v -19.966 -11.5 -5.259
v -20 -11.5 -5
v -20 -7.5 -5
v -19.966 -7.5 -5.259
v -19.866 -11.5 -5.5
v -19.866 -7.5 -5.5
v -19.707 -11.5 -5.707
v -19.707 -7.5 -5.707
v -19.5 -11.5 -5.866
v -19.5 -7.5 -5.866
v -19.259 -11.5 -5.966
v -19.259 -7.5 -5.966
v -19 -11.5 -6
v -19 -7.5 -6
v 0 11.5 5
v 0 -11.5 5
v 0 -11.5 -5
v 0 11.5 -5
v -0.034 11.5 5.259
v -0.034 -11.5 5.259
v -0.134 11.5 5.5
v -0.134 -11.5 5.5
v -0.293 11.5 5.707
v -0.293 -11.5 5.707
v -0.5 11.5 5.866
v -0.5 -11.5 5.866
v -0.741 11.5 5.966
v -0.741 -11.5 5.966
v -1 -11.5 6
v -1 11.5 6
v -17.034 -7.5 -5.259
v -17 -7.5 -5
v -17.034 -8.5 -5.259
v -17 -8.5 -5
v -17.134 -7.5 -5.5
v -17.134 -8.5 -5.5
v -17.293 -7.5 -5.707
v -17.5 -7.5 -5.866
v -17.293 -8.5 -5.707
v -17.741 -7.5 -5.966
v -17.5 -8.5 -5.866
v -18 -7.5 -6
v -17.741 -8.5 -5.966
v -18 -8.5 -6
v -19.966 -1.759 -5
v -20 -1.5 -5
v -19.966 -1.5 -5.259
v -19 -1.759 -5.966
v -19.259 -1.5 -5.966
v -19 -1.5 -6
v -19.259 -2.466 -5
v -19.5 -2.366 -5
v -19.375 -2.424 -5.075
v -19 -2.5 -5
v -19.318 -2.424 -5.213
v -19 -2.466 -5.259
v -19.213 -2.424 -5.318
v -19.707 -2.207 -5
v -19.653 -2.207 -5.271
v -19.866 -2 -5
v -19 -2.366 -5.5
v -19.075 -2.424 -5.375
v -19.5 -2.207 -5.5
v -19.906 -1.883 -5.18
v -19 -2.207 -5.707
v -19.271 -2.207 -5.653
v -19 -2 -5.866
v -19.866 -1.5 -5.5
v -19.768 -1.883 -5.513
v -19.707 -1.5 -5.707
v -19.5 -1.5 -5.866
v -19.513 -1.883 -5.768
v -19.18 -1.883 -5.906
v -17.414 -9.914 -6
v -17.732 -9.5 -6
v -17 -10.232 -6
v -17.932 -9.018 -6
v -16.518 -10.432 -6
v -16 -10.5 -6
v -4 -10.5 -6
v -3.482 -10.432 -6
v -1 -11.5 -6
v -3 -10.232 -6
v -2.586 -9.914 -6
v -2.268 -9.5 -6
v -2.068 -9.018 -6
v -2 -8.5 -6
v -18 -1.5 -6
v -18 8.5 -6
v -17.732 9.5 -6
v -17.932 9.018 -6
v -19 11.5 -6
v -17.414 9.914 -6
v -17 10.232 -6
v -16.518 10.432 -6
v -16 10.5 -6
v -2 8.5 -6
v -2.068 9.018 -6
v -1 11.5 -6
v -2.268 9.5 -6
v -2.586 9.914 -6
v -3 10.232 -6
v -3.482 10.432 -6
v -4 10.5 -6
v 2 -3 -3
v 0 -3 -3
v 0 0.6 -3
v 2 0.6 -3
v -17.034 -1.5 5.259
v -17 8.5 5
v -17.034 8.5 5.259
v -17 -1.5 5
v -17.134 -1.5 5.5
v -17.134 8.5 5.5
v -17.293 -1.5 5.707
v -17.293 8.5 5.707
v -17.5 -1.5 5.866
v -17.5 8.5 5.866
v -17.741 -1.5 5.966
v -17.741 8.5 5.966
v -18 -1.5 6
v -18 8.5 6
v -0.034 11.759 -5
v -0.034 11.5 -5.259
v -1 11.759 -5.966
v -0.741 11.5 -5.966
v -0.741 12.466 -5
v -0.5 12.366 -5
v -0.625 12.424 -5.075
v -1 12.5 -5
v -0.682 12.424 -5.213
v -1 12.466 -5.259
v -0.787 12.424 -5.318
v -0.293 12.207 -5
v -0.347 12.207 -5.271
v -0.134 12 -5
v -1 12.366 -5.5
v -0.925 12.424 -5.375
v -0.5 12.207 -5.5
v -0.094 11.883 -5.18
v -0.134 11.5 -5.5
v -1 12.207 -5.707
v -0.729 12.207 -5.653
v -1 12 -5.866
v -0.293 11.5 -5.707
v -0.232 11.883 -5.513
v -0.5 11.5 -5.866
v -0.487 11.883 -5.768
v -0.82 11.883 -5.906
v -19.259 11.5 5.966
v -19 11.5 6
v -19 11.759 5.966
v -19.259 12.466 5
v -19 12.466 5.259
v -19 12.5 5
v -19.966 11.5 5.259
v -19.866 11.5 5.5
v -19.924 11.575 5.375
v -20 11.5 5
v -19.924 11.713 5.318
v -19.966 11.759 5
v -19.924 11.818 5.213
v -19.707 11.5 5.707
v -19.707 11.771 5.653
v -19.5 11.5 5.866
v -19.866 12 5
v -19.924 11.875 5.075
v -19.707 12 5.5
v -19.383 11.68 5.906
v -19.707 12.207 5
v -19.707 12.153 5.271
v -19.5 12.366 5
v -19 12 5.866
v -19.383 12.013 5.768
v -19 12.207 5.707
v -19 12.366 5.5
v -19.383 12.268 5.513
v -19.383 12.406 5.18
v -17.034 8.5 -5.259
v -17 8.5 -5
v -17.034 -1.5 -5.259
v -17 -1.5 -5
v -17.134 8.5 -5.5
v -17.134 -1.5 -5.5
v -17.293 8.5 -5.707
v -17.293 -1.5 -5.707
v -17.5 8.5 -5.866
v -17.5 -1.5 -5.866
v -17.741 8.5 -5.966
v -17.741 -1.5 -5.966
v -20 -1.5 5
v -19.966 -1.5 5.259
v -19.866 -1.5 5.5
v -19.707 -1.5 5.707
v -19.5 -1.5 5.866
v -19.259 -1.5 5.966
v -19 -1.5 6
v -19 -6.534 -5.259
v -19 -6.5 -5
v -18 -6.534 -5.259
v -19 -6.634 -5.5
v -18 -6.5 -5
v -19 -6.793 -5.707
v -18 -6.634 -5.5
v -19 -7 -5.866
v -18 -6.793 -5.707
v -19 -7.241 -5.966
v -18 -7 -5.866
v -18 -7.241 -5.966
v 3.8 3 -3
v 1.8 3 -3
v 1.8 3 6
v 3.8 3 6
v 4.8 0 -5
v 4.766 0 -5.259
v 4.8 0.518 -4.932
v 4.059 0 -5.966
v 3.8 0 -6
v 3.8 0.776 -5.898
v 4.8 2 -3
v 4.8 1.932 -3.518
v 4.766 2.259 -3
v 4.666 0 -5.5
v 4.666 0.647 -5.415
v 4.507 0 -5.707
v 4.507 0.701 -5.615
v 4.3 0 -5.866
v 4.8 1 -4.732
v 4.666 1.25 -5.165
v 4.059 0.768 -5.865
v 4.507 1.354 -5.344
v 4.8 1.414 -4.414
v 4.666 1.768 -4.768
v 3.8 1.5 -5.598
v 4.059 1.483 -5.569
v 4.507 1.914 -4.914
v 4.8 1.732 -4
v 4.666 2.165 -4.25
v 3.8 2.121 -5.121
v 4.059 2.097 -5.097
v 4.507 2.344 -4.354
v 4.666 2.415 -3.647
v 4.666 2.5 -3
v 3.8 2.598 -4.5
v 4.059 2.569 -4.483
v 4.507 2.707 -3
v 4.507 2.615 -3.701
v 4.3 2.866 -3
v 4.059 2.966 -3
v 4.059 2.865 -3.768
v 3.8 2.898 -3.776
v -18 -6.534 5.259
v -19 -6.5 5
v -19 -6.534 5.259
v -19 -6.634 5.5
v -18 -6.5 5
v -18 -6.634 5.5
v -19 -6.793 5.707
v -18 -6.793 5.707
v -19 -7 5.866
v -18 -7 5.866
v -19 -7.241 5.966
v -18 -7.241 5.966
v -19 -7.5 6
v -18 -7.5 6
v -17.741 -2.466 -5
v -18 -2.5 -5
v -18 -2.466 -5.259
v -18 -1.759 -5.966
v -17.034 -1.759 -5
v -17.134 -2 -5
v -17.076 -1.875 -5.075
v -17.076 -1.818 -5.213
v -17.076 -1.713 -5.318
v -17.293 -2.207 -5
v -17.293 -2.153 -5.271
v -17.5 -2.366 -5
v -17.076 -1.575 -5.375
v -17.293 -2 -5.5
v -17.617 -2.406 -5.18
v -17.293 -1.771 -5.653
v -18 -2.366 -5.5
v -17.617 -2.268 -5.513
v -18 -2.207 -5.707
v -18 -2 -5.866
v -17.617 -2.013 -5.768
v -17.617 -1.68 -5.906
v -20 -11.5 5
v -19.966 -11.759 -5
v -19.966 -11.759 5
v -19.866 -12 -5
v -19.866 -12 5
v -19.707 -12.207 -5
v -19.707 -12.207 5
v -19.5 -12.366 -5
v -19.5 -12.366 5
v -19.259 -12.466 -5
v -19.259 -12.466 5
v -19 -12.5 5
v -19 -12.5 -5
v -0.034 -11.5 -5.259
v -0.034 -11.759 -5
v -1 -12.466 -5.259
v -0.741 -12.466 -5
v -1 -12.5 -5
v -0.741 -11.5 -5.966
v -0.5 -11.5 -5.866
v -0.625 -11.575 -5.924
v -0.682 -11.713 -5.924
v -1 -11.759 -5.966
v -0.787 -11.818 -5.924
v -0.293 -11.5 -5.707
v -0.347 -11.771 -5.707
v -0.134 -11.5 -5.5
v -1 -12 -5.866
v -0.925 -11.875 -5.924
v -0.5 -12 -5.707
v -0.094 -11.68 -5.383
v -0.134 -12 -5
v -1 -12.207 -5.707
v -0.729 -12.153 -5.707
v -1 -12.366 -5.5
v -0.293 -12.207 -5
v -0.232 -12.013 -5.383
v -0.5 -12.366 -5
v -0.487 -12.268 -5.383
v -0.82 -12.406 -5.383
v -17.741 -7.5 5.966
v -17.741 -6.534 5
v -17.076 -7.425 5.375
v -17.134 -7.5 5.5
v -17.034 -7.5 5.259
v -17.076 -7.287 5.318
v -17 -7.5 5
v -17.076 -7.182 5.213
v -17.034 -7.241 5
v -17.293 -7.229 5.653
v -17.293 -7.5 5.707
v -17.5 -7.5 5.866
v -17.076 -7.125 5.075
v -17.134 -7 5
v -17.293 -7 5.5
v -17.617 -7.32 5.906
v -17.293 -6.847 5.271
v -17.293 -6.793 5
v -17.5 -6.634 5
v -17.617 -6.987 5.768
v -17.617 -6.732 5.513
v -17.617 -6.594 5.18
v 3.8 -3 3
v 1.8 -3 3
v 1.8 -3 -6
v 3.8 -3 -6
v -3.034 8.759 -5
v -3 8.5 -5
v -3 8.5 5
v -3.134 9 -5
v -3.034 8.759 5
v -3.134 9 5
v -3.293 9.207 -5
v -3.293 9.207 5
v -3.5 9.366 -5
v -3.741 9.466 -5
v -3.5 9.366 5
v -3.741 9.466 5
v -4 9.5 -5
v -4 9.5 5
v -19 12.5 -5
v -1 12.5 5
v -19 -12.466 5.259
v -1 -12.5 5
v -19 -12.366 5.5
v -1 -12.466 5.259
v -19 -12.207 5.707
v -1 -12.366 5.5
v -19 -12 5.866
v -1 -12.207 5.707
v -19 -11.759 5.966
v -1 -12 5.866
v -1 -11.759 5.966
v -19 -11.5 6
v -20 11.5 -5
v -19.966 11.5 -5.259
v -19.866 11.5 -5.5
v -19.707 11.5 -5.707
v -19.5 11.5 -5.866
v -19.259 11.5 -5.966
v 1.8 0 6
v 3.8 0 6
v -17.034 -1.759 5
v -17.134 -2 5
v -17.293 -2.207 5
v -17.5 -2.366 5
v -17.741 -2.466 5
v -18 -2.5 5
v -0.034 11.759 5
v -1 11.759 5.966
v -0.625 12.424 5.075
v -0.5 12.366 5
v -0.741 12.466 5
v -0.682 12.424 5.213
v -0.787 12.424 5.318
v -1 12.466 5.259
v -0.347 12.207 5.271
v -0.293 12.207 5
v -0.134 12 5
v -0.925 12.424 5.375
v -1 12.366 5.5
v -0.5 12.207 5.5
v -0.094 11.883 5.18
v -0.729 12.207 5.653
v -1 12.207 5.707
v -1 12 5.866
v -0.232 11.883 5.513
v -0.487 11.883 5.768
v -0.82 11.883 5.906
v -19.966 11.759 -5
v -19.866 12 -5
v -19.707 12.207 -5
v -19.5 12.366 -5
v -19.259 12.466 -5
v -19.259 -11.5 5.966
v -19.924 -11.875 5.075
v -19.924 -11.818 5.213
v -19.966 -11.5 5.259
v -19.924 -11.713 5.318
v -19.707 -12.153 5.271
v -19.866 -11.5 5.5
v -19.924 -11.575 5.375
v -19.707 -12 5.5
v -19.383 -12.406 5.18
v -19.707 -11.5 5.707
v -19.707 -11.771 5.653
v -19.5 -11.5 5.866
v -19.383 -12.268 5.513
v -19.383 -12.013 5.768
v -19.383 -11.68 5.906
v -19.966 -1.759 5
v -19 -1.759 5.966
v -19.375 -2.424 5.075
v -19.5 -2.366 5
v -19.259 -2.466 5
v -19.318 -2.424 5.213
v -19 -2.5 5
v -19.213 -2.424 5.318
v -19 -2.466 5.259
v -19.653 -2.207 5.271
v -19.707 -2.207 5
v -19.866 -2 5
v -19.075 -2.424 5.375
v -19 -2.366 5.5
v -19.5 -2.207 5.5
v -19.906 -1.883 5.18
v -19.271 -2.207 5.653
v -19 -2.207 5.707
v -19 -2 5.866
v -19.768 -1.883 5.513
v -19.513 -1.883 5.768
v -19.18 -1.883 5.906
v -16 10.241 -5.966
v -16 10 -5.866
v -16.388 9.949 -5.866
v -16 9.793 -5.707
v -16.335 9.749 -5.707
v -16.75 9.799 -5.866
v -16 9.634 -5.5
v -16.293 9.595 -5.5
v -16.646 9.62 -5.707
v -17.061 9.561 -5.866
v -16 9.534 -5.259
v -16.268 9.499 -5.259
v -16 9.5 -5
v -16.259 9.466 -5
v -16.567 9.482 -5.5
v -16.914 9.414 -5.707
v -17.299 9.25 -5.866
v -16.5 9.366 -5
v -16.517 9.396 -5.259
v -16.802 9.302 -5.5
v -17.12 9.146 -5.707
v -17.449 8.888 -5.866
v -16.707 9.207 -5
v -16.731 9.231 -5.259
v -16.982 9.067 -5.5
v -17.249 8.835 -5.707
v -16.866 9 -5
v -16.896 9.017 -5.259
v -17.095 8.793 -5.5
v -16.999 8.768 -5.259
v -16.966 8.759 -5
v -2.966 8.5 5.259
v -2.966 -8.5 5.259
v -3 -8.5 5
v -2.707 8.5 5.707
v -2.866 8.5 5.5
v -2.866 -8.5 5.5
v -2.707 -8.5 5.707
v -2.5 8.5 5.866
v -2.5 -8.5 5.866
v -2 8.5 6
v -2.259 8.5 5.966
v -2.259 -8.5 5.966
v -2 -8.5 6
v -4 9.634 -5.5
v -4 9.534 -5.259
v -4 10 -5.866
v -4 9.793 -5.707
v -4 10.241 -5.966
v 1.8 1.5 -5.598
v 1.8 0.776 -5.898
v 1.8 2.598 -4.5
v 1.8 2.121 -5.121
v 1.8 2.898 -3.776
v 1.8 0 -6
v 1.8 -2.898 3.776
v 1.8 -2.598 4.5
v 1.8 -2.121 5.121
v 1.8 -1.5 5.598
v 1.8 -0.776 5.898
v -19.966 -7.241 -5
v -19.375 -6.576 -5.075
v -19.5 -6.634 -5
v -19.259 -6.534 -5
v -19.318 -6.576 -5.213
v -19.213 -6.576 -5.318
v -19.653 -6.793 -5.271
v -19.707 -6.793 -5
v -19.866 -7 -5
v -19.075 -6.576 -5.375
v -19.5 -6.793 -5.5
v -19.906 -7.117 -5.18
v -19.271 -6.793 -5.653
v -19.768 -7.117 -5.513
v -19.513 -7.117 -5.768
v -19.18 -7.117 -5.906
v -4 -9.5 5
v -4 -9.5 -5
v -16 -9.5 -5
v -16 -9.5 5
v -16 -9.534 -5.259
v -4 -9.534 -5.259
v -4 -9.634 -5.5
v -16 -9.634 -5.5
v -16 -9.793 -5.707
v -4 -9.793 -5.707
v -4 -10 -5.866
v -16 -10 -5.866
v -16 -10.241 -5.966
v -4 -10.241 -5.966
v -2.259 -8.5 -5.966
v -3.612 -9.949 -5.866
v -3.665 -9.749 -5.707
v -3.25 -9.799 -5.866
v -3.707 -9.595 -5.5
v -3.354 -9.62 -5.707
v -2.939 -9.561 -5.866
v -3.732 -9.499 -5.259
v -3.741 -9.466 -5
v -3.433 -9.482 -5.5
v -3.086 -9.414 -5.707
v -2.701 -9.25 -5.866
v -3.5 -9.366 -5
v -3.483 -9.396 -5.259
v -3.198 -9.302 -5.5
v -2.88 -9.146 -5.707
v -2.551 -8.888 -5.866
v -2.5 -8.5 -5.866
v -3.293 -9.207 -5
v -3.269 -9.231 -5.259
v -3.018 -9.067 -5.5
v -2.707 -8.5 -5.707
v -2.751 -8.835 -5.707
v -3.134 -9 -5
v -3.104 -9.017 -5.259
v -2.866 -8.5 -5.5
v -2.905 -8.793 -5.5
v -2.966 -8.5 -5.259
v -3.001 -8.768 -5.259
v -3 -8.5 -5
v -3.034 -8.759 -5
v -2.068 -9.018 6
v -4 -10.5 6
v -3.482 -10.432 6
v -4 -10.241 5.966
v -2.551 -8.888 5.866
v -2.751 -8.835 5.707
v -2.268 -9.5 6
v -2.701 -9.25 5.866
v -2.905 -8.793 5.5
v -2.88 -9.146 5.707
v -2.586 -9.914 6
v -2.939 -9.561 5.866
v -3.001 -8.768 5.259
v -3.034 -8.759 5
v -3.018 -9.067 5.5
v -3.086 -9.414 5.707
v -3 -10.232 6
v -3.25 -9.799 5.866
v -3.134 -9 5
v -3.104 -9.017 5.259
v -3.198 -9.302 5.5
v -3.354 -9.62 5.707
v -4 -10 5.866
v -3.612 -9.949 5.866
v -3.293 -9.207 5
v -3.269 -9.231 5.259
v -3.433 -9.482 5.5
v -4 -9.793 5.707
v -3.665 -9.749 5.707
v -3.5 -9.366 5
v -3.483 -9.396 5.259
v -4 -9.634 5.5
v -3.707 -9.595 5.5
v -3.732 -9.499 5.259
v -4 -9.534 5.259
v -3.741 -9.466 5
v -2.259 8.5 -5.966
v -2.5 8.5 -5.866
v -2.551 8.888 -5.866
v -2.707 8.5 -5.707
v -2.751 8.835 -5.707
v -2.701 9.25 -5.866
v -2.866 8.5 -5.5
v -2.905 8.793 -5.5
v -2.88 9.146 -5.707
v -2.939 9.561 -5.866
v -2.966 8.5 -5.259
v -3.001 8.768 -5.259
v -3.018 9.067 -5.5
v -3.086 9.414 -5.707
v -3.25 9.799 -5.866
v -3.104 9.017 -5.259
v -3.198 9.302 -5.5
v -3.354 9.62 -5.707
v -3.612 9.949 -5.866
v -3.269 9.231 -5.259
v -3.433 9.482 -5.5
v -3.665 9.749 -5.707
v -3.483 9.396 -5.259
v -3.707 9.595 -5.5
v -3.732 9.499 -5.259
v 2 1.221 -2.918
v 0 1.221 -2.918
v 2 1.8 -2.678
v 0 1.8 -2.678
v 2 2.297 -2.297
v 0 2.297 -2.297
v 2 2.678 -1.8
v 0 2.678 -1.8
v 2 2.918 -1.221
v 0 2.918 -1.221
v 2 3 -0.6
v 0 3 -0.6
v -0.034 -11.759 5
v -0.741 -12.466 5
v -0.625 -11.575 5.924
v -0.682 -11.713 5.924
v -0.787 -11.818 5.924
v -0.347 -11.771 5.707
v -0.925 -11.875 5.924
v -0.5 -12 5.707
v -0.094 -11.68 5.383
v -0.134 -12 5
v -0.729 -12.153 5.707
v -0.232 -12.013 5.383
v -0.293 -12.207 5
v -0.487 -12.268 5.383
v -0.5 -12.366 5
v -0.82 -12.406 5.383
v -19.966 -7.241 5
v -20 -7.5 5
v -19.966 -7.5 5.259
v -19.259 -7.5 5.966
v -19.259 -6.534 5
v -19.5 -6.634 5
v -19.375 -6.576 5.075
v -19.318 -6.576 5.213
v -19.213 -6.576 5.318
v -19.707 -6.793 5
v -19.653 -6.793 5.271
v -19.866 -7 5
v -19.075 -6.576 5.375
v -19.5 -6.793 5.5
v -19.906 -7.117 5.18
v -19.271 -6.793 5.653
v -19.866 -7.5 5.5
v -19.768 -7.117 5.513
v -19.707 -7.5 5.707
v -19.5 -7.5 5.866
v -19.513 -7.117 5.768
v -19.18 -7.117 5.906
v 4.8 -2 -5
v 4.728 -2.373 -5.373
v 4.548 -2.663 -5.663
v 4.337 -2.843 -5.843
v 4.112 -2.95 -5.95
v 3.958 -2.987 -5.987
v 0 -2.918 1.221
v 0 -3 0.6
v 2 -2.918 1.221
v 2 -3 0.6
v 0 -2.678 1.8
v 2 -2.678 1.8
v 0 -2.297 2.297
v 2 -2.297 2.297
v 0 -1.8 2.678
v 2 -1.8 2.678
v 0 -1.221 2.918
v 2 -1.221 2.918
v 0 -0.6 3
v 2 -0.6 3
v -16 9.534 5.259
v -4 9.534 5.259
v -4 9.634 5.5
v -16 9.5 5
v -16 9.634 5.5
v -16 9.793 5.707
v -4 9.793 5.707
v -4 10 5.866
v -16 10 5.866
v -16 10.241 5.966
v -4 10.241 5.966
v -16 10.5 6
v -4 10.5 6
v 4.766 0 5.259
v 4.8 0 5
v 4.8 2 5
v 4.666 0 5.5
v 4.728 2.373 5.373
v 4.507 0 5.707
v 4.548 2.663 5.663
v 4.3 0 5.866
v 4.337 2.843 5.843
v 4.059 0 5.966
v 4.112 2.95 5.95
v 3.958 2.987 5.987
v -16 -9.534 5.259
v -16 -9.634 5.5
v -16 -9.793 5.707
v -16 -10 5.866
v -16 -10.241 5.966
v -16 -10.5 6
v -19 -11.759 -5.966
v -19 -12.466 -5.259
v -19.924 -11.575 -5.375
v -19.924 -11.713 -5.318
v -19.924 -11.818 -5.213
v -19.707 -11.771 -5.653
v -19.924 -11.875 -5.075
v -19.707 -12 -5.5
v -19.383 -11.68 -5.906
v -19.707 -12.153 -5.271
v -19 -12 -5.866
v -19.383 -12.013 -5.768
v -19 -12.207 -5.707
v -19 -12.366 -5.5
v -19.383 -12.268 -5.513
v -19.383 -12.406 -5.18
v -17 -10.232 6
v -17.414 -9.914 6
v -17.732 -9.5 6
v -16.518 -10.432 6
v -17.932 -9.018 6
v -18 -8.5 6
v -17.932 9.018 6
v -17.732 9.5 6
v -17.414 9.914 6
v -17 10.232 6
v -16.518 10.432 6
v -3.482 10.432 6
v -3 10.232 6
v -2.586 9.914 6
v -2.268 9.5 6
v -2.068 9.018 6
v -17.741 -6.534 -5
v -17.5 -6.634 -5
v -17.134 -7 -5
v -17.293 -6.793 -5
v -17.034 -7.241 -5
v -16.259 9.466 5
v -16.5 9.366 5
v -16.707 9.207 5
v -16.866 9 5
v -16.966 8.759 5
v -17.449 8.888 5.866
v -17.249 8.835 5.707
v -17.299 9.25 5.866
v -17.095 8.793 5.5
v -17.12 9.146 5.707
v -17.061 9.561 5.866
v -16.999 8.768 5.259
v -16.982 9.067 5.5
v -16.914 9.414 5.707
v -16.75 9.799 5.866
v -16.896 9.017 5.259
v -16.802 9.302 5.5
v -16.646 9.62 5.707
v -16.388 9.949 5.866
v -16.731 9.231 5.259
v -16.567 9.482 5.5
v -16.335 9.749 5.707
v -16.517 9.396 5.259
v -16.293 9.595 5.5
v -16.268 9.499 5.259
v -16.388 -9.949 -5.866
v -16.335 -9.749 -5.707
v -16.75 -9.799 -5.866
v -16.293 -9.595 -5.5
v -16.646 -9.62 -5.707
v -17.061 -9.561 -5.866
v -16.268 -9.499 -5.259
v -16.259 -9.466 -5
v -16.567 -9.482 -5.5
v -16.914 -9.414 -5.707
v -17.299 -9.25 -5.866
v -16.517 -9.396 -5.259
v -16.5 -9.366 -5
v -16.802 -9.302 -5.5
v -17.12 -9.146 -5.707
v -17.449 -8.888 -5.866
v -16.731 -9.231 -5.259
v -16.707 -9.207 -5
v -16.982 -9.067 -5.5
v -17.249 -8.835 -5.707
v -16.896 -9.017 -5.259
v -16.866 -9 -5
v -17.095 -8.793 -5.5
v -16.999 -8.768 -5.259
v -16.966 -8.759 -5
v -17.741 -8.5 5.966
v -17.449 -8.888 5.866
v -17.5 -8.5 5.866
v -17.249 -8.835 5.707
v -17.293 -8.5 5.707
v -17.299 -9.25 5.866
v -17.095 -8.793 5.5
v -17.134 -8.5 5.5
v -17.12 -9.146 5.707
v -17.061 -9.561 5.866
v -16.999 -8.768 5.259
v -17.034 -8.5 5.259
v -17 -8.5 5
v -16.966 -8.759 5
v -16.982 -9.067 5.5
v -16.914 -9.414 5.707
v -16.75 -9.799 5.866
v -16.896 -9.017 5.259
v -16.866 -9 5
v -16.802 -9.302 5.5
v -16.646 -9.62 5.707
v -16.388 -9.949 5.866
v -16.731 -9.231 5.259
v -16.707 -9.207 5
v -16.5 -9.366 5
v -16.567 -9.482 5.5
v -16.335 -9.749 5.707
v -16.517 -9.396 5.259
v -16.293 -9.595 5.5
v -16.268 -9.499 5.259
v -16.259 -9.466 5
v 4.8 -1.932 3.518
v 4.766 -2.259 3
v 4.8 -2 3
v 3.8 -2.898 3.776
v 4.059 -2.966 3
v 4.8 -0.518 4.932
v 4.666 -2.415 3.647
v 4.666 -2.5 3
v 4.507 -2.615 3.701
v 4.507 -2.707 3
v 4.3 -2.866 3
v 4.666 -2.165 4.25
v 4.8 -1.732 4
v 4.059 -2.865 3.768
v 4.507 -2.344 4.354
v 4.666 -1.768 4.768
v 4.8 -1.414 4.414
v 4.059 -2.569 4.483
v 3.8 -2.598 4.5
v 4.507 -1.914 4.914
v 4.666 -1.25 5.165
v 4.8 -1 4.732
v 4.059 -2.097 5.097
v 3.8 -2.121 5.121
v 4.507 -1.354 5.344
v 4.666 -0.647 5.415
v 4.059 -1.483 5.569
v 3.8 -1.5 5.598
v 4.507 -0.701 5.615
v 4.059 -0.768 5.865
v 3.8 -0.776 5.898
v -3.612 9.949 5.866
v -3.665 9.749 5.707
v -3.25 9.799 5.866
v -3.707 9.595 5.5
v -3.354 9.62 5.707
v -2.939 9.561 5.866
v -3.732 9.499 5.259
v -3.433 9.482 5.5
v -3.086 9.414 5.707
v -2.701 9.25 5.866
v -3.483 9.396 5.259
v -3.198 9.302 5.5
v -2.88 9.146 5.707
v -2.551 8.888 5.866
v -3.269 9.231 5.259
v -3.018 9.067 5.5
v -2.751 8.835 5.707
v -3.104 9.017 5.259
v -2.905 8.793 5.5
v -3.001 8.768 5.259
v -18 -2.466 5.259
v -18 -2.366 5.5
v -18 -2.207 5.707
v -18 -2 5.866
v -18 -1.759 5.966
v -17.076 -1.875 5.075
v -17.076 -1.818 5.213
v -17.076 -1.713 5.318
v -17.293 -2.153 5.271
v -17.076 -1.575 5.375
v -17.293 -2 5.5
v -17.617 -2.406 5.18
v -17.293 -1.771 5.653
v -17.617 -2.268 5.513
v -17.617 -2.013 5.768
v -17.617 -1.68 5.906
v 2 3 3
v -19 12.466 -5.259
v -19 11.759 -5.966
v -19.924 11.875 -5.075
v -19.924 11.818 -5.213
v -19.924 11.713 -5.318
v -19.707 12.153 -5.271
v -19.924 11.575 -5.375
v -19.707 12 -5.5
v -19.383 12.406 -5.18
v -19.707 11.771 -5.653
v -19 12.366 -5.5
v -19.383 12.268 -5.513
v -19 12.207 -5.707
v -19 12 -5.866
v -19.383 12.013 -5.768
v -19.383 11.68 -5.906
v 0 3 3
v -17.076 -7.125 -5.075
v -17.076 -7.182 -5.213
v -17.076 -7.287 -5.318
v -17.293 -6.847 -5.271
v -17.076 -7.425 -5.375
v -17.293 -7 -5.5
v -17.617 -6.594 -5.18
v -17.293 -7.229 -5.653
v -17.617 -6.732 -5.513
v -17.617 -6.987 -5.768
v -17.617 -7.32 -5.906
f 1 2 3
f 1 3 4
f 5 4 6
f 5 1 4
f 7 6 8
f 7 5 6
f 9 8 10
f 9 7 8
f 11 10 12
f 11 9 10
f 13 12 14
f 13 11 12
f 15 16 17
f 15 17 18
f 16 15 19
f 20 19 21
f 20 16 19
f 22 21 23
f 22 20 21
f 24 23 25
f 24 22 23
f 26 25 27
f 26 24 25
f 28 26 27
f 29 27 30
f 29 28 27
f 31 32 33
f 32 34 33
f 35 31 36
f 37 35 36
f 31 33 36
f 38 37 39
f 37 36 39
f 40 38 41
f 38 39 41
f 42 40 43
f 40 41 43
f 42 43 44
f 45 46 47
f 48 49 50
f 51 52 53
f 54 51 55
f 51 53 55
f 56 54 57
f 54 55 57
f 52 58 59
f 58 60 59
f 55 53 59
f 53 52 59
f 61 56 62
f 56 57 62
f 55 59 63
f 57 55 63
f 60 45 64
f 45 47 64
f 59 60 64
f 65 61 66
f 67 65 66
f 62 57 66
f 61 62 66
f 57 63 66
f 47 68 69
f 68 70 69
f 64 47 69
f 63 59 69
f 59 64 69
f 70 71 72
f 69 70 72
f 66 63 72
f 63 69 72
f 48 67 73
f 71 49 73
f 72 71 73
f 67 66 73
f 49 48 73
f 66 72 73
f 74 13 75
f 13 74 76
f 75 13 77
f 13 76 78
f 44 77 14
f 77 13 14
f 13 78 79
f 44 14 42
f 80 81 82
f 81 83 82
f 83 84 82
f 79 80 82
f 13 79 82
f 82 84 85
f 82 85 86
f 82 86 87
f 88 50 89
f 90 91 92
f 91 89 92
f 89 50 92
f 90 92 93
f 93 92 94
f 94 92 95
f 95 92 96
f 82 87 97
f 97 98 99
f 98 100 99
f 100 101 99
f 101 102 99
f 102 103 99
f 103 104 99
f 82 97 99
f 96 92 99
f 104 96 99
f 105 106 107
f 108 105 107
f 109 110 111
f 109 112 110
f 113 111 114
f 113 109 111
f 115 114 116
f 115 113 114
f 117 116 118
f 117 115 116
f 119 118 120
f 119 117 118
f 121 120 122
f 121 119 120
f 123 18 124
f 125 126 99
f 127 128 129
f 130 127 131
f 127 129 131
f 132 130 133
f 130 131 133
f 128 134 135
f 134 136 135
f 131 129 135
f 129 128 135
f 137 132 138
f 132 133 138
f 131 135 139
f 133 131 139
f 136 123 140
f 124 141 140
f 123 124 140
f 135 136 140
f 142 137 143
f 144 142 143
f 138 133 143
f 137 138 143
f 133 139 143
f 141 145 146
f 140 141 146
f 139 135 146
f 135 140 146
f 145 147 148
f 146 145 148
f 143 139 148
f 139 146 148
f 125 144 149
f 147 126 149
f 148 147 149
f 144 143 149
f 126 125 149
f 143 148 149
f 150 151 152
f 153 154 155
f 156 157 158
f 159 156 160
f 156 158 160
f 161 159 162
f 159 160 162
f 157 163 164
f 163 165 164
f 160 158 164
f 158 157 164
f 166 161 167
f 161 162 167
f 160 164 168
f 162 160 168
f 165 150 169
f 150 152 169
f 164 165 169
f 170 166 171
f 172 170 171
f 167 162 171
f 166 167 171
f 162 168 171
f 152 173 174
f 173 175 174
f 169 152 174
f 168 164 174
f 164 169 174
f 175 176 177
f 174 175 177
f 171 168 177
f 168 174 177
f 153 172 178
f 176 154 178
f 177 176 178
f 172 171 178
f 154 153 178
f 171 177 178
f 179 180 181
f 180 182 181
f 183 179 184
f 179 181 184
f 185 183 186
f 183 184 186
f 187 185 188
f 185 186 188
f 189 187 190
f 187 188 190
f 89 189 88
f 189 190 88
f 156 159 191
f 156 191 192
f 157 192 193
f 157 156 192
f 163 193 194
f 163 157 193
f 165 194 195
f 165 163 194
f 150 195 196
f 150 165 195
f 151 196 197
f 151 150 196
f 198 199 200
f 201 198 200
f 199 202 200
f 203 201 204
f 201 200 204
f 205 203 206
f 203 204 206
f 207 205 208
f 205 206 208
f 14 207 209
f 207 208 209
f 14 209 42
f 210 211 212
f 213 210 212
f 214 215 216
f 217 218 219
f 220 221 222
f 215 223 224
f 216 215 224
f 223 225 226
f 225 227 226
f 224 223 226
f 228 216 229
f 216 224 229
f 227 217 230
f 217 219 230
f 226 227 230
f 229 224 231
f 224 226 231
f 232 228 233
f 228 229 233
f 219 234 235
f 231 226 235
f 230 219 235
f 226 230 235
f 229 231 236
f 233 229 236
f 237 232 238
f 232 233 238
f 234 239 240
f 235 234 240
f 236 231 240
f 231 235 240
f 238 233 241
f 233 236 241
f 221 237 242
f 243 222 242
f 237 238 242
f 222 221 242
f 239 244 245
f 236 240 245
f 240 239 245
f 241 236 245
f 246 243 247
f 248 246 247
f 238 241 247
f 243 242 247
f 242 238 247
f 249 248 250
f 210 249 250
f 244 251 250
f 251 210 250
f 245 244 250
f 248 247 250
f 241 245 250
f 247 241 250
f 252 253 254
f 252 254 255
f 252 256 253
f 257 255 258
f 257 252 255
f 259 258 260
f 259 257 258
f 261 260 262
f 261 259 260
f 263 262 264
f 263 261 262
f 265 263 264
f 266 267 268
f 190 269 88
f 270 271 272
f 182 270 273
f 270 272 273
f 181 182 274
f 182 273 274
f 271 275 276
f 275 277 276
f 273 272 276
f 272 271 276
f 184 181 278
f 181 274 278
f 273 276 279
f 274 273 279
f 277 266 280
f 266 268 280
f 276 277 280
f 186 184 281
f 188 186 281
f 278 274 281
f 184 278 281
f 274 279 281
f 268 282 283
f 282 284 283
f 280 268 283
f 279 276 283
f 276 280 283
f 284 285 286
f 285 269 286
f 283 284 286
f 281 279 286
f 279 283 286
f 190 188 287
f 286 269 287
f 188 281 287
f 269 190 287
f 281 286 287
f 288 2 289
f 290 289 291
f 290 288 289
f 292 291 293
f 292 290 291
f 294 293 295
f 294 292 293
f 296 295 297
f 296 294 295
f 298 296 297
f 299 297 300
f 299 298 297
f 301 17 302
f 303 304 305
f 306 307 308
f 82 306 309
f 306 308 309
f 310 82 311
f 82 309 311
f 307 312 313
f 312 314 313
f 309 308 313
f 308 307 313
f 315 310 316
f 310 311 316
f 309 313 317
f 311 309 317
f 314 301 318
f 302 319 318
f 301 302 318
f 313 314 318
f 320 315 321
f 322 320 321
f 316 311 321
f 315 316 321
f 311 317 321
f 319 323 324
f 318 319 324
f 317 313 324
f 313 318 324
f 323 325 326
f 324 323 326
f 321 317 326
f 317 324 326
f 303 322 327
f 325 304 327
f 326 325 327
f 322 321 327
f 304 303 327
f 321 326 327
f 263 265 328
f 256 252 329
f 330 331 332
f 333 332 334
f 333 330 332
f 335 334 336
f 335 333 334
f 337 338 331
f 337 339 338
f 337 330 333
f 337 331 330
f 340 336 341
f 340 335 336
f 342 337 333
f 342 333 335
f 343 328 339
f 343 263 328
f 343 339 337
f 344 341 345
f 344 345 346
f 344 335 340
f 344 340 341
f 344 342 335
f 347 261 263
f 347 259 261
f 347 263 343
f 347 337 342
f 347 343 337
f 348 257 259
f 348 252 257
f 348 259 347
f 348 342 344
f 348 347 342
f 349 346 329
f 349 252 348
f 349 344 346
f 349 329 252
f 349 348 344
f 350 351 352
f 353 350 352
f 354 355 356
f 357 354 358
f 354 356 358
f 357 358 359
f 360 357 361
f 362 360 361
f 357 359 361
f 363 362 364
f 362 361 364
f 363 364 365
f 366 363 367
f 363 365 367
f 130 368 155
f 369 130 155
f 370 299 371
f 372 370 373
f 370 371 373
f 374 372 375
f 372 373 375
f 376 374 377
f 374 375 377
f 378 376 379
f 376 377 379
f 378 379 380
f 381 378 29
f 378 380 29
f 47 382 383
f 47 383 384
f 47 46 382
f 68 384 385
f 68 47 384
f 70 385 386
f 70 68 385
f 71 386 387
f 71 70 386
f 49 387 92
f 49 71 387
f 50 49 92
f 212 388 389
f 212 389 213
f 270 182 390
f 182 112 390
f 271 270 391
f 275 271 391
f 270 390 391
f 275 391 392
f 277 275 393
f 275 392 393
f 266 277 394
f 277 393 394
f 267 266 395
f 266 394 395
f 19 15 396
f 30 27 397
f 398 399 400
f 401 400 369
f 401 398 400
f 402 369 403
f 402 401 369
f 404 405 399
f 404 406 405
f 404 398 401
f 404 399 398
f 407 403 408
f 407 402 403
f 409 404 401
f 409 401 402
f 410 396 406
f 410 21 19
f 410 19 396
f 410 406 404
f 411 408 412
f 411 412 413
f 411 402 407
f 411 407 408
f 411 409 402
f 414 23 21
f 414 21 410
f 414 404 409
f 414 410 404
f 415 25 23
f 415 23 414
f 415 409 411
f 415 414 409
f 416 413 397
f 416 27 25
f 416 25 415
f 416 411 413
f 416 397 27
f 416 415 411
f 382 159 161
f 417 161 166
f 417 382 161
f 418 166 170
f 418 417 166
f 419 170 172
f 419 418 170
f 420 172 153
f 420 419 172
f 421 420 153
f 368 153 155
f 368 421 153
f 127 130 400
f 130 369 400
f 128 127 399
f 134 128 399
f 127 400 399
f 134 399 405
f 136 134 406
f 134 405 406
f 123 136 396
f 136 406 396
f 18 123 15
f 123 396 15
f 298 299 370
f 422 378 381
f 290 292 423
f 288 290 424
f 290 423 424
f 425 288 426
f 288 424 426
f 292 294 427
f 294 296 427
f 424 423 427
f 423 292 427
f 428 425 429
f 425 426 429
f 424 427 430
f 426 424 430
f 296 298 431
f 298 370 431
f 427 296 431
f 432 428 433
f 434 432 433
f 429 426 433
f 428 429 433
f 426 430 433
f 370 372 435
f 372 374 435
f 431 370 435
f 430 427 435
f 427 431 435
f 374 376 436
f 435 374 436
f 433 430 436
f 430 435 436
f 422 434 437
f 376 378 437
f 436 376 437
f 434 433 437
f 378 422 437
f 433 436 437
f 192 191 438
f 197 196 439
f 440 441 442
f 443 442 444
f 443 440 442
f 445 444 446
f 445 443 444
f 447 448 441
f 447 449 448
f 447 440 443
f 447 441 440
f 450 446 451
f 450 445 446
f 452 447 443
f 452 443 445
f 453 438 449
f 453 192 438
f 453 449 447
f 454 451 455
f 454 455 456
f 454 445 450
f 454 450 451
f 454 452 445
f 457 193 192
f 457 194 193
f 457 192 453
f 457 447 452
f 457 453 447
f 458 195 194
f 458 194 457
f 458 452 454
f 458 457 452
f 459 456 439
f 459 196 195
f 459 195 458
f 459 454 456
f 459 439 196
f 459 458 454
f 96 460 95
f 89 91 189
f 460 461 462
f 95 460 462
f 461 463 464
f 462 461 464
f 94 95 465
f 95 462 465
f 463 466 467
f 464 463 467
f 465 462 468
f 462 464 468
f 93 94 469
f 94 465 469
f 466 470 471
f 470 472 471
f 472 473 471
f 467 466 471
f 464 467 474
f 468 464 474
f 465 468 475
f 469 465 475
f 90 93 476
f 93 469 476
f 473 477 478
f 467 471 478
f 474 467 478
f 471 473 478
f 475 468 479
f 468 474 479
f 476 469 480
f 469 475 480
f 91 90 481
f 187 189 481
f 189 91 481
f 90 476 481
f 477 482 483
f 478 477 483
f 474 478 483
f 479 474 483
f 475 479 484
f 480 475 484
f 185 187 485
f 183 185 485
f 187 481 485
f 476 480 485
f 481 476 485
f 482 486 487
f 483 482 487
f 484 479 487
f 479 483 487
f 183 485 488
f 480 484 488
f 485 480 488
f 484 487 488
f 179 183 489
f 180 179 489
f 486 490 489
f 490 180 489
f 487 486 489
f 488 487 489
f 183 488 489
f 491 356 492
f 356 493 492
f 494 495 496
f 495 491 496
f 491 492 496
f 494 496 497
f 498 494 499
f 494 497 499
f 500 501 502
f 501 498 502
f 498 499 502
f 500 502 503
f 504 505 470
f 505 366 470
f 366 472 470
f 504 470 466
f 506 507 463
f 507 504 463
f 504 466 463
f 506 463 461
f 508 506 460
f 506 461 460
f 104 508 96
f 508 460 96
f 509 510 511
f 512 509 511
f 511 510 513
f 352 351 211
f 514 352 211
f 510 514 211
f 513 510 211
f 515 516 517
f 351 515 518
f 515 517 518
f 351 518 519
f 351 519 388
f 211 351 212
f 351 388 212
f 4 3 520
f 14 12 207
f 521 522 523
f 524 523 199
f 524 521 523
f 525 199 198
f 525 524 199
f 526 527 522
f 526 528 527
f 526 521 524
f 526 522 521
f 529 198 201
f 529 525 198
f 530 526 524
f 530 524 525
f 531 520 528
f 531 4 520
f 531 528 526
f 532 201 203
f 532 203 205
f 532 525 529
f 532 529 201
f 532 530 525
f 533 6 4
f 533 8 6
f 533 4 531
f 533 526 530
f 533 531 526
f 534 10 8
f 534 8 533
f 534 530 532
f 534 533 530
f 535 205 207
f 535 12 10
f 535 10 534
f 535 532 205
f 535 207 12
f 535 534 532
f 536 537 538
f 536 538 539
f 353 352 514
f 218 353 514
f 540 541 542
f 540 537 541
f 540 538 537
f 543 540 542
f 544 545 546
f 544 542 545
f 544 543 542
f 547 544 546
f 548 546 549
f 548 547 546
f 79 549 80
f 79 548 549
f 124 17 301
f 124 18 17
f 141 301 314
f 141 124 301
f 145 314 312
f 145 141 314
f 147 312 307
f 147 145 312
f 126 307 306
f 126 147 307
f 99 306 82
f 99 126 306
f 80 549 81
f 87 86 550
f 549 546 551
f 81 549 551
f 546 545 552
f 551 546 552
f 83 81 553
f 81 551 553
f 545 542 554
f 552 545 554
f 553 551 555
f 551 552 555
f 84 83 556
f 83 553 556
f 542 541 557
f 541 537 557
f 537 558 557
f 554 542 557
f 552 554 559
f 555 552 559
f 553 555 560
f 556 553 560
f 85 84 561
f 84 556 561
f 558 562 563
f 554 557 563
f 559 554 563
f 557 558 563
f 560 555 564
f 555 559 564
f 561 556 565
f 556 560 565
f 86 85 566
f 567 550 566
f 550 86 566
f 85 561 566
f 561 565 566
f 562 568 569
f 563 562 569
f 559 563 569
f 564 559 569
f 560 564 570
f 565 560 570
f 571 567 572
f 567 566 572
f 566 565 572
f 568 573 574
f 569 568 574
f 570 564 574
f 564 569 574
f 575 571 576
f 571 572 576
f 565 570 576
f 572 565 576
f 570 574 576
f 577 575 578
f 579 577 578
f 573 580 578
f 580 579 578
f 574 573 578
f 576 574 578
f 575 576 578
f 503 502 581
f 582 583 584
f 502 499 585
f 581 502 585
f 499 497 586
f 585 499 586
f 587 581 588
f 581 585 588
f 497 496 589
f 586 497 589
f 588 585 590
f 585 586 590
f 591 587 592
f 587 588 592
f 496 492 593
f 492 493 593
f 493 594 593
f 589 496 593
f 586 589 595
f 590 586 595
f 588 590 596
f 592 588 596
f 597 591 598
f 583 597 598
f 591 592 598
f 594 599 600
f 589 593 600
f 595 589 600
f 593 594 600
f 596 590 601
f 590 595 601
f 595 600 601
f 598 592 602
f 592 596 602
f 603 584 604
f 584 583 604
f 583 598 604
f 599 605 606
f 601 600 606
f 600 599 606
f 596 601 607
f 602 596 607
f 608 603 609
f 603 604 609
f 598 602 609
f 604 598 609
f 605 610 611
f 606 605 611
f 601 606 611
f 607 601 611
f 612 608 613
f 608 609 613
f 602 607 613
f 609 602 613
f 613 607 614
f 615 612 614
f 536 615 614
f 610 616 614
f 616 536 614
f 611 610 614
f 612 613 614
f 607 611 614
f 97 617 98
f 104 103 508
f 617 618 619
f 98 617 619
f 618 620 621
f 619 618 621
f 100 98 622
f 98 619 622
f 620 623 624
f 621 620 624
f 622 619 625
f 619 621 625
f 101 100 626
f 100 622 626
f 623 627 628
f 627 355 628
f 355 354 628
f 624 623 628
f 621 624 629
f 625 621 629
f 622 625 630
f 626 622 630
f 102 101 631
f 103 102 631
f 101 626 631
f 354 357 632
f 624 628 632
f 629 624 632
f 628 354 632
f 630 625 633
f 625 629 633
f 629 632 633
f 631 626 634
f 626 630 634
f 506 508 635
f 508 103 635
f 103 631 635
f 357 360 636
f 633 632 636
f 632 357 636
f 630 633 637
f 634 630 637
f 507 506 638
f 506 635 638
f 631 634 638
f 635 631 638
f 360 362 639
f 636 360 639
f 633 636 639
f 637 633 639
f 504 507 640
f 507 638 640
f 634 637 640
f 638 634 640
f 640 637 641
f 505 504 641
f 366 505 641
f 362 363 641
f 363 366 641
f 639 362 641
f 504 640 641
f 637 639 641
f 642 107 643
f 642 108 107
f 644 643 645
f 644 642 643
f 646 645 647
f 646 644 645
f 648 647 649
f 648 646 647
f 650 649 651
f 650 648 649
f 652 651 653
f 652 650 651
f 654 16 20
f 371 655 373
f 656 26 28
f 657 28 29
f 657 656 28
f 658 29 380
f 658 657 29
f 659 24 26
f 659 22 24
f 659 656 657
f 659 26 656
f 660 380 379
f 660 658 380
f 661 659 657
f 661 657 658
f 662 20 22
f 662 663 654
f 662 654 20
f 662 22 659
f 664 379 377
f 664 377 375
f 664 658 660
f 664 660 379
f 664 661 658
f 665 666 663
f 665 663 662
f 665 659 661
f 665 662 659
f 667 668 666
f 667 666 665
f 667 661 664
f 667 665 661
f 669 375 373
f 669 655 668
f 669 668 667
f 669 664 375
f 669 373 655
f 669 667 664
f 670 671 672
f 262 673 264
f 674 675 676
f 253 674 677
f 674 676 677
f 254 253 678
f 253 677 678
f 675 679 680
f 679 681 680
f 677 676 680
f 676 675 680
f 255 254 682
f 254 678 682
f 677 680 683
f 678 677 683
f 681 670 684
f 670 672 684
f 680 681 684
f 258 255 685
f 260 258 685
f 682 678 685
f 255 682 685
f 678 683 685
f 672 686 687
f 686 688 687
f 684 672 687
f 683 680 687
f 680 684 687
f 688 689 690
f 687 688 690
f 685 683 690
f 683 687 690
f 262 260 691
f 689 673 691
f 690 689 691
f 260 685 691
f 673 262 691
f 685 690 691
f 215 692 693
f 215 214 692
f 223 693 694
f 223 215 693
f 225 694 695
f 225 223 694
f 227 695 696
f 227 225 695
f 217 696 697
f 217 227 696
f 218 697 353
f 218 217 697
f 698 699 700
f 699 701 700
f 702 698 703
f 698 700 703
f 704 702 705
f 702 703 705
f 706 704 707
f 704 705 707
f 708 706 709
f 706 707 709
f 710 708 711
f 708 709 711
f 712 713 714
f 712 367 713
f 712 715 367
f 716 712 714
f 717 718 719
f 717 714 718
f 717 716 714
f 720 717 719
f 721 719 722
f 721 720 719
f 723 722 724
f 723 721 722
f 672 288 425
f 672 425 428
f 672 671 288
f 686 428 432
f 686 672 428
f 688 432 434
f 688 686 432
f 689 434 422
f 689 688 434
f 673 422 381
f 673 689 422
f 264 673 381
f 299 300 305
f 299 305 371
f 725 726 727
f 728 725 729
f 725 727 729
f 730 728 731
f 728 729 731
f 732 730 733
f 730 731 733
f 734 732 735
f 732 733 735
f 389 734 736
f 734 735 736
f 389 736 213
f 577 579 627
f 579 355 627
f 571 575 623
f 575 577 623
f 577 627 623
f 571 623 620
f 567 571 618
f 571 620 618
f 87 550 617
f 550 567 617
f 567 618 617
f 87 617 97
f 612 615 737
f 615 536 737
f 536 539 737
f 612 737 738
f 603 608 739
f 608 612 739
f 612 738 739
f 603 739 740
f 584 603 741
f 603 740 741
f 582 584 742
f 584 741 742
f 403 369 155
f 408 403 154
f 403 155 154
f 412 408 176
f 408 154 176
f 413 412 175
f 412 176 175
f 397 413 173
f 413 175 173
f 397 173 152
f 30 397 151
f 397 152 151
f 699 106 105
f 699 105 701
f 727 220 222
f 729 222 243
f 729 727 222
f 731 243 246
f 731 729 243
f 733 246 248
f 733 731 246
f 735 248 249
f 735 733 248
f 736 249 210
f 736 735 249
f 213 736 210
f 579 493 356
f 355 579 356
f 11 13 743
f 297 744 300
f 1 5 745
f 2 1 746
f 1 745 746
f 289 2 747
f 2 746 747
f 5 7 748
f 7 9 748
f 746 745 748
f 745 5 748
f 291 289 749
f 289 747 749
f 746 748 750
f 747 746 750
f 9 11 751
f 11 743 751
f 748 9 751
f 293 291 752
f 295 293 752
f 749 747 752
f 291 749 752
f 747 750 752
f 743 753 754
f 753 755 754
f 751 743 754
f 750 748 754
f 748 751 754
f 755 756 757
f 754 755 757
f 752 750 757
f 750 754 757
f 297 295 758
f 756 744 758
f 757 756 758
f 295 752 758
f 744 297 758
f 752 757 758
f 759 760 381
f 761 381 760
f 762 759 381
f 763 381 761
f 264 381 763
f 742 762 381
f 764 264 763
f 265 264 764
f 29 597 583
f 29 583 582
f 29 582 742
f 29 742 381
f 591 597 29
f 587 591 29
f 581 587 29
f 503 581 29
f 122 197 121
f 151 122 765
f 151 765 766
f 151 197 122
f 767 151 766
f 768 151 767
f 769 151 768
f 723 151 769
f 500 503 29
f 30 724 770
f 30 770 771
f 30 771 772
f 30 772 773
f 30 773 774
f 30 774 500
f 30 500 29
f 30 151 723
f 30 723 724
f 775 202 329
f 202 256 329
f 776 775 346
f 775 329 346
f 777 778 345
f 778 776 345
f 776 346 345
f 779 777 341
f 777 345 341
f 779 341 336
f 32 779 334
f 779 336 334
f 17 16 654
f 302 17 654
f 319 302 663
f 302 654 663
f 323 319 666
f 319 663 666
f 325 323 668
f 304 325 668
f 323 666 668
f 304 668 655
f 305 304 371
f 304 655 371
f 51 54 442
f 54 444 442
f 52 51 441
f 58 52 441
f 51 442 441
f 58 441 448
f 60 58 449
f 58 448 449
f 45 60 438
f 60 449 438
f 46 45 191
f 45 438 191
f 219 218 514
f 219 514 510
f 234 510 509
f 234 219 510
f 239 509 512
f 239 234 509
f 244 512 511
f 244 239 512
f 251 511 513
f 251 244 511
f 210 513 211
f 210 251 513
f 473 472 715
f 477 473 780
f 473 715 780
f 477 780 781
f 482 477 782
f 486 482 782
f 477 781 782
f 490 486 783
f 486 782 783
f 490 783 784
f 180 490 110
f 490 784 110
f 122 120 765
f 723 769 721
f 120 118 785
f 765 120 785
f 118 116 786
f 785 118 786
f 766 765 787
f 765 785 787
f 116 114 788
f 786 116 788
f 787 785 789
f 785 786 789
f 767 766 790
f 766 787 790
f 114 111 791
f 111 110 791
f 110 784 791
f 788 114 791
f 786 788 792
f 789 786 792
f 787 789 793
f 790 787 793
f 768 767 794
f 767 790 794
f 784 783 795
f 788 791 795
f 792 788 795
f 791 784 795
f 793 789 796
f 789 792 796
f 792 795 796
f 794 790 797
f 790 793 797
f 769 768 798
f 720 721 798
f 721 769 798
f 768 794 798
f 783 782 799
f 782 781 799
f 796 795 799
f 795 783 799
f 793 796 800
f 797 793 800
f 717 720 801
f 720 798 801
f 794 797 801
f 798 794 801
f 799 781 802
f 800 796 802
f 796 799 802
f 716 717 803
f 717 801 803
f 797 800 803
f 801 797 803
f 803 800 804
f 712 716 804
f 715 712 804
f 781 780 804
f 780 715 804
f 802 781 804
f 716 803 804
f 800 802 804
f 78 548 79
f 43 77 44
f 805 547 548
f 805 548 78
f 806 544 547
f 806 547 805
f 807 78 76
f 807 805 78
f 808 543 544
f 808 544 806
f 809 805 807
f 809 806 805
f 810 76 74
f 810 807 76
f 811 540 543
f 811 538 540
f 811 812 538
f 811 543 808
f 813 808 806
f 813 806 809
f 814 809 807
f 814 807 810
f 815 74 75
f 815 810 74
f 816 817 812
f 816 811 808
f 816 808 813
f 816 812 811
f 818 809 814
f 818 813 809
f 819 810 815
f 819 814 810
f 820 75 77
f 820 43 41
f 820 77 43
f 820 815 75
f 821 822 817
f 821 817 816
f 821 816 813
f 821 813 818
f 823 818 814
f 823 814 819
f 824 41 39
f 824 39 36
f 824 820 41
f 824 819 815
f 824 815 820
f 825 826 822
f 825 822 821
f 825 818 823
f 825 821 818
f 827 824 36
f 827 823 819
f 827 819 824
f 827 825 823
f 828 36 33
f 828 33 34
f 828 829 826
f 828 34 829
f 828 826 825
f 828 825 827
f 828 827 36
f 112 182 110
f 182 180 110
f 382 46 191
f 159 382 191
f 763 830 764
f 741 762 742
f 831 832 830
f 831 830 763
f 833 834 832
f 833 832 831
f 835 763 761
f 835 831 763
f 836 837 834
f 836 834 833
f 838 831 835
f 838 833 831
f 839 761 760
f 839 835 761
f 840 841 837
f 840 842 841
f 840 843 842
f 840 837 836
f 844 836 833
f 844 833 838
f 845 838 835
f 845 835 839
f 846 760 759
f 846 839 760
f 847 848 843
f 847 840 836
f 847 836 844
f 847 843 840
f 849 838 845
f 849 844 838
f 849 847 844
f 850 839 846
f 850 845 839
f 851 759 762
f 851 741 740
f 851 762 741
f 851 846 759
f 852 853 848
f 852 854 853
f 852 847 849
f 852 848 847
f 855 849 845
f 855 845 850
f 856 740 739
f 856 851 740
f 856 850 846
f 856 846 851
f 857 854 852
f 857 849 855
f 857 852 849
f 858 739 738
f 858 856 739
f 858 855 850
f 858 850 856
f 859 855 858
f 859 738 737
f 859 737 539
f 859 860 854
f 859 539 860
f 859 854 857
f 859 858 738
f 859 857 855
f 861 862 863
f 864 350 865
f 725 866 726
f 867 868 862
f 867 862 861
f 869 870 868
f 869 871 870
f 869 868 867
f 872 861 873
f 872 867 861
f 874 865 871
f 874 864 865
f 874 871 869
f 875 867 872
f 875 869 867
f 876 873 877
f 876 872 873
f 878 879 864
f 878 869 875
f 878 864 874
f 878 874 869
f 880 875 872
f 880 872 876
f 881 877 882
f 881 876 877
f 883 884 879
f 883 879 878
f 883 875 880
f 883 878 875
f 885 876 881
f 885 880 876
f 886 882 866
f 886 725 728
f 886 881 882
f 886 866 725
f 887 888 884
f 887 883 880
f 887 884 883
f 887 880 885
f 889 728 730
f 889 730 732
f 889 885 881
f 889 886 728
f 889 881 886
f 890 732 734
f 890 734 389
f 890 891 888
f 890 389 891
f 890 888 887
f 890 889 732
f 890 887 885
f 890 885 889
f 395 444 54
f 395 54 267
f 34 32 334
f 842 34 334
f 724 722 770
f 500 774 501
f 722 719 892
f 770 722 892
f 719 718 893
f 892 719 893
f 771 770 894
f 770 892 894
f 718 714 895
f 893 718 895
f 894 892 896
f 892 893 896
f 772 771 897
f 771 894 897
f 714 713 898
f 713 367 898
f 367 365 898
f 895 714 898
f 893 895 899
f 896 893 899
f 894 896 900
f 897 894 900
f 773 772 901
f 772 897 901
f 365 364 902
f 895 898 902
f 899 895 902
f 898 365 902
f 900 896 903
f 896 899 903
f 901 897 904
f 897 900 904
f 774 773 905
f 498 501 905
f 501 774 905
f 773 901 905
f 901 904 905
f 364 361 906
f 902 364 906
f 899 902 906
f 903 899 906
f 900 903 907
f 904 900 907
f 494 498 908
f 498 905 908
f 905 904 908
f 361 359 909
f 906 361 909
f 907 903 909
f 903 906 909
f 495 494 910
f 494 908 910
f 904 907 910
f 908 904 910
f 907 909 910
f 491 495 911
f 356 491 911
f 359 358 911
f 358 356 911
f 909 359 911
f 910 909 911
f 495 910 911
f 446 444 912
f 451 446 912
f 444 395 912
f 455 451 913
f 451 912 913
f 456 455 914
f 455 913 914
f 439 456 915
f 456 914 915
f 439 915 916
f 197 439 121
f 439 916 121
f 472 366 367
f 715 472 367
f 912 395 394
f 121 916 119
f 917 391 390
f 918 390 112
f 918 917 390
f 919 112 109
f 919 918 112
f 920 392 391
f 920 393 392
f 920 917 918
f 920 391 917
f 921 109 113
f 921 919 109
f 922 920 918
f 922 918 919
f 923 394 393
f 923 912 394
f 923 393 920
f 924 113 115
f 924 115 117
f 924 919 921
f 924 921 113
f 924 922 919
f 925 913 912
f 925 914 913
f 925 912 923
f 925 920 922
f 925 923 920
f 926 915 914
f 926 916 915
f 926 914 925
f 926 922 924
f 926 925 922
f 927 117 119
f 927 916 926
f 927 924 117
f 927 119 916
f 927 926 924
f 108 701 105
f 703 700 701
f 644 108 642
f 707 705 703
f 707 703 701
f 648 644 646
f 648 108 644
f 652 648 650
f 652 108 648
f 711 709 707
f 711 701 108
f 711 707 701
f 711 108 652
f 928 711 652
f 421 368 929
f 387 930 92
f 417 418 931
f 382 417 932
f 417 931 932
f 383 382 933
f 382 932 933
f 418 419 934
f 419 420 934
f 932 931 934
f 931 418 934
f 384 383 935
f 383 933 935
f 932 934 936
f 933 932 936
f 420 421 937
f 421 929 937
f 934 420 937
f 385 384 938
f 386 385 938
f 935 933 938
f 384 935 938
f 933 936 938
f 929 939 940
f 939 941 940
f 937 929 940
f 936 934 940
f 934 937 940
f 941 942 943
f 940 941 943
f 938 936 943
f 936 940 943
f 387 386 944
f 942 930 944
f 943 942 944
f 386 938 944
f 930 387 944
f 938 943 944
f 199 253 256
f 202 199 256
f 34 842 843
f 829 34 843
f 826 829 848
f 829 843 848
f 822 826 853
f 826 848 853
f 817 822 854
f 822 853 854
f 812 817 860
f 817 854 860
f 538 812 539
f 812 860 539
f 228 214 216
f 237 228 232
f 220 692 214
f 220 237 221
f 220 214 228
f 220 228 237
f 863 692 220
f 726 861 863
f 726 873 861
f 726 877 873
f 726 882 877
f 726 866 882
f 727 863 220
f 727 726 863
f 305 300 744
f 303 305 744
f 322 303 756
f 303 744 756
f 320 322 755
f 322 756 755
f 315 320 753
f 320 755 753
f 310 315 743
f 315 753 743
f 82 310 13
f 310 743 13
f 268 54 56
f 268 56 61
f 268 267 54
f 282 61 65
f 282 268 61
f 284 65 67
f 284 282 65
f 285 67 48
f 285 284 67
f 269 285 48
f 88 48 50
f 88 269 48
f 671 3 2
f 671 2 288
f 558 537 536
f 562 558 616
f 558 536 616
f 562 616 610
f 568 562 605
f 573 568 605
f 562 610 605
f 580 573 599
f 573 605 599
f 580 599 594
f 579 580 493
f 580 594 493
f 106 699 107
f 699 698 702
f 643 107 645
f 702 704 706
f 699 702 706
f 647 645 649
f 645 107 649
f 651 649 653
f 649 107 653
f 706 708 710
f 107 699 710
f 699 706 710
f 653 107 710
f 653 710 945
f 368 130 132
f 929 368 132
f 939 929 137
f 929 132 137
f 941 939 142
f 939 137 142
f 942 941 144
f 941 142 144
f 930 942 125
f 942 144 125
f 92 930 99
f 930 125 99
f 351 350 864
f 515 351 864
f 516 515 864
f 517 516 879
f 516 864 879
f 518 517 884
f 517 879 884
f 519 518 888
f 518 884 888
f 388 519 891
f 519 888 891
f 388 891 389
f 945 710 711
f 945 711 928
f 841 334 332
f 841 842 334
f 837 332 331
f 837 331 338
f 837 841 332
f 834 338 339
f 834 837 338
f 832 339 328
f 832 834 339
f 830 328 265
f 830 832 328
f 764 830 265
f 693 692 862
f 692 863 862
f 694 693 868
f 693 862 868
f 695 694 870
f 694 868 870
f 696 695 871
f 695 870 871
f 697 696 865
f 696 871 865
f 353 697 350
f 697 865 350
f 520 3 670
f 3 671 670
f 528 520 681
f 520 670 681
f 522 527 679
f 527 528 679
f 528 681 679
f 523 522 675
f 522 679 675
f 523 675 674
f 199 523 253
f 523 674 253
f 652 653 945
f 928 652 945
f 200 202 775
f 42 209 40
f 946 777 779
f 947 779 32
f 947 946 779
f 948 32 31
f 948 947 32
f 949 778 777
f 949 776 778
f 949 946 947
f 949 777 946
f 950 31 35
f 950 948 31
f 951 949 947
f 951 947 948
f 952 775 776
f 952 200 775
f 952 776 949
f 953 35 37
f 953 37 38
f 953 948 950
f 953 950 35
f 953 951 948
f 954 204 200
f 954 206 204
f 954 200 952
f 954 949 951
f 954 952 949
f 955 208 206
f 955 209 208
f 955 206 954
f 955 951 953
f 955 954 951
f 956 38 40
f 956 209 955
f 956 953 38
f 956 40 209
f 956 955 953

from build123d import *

# Parameters (mm, degrees)
F0_W       = 3
F0_H       = 12
F0_W_2     = 6
F0_H_2     = 3
F0_H_3     = 6
F1_DEPTH   = 3
F2_START   = 1.8
F2_DEPTH   = 3
F3_DEPTH   = 2
F4_START   = -3
F4_DEPTH   = 17
F5_R       = 3
F6_R       = 2.4
F7_R       = 1
F8_R       = 1
F9_W       = 3
F9_H       = 12
F10_DEPTH  = 12
F11_START  = 4
F10_FACE_W = 3
F10_FACE_H = 12
F11_DEPTH  = 3
F12_R      = 1


with BuildPart() as f1:
    # F0 (on Right) → F1 (new body)
    with BuildSketch(Plane.YZ):
        with Locations((-11, 0)):
            Rectangle(F0_W, F0_H)
        with Locations((0, 4.5)):
            Rectangle(F0_W_2, F0_H_2)
        with Locations((0, -4.5)):
            Rectangle(F0_W_2, F0_H_2)
        Rectangle(F0_W_2, F0_H_3)
        with Locations((11, 0)):
            Rectangle(F0_W, F0_H)
        Polygon((-3, -6), (-3, -3), (-3, 3), (-3, 6), (-9.5, 6), (-9.5, -6), align=None)
        Polygon((3, 3), (3, -3), (3, -6), (9.5, -6), (9.5, 6), (3, 6), align=None)
    extrude(amount=-F1_DEPTH)

    # F0 (on Right) → F4 (join)
    with BuildSketch(Plane.YZ.offset(F4_START)):
        with Locations((11, 0)):
            Rectangle(F0_W, F0_H)
        with Locations((-11, 0)):
            Rectangle(F0_W, F0_H)
    extrude(amount=-F4_DEPTH)

    # F8
    f8_edges = [f1.edges().sort_by_distance(p)[0] for p in [
        (0, -12.5, 0),
        (0, 0, 6),
        (0, 0, -6),
        (0, 12.5, 0),
        (-10, -12.5, -6),
        (-10, -12.5, 6),
        (-10, 12.5, 6),
        (-10, 12.5, -6),
    ]]
    fillet(f8_edges, radius=F8_R)

    # F9 (on face) → F10 (join)
    with BuildSketch(Plane.XZ.offset(-9.5)):
        with Locations((-18.5, 0)):
            Rectangle(F9_W, F9_H)
    extrude(amount=F10_DEPTH)

    # F10_face (on face) → F11 (join)
    with BuildSketch(Plane(origin=(-18.5, -2.5, 0), x_dir=(1, 0, 0), z_dir=(0, -1, 0)).offset(F11_START)):
        Rectangle(F10_FACE_W, F10_FACE_H)
    extrude(amount=F11_DEPTH)

    # F12
    f12_edges = [f1.edges().sort_by_distance(p)[0] for p in [
        (-20, -12.5, 0),
        (-20, -9, 6),
        (-20, -12.207107, 5.707107),
        (-20, -9, -6),
        (-20, -6.5, 0),
        (-20, -12.207107, -5.707107),
        (-20, 4.5, 6),
        (-20, -2.5, 0),
        (-18.5, -2.5, -6),
        (-18.5, -2.5, 6),
        (-17, -2.5, 0),
        (-18.5, -6.5, 6),
        (-17, -8, 6),
        (-17, 3.5, 6),
        (-10, 9.5, 6),
        (-3, 0, 6),
        (-10, -9.5, 6),
        (-20, 12.207107, -5.707107),
        (-20, 4.5, -6),
        (-20, 12.5, 0),
        (-20, 12.207107, 5.707107),
        (-18.5, -6.5, -6),
        (-17, -6.5, 0),
        (-10, -9.5, -6),
        (-17, -8, -6),
        (-3, 0, -6),
        (-10, 9.5, -6),
        (-17, 3.5, -6),
        (-17, -9.5, 0),
        (-17, 9.5, 0),
        (-3, 9.5, 0),
        (-3, -9.5, 0),
    ]]
    fillet(f12_edges, radius=F12_R)


with BuildPart() as f2:
    # F0 (on Right) → F2 (new body)
    with BuildSketch(Plane.YZ.offset(F2_START)):
        with Locations((0, 4.5)):
            Rectangle(F0_W_2, F0_H_2)
        Rectangle(F0_W_2, F0_H_3)
        with Locations((0, -4.5)):
            Rectangle(F0_W_2, F0_H_2)
    extrude(amount=F2_DEPTH)

    # F5
    f5_edges = [f2.edges().sort_by_distance(p)[0] for p in [
        (3.3, -3, 6),
        (3.3, 3, -6),
    ]]
    fillet(f5_edges, radius=F5_R)

    # F7
    f7_edges = [f2.edges().sort_by_distance(p)[0] for p in [
        (4.8, 3, 1.5),
        (4.8, 1.5, 6),
        (4.8, -3, -1.5),
        (4.8, -2.12132, 5.12132),
        (4.8, -1.5, -6),
        (4.8, 2.12132, -5.12132),
    ]]
    fillet(f7_edges, radius=F7_R)


with BuildPart() as f3:
    # F0 (on Right) → F3 (new body)
    with BuildSketch(Plane.YZ):
        Rectangle(F0_W_2, F0_H_3)
    extrude(amount=F3_DEPTH)

    # F6
    f6_edges = [f3.edges().sort_by_distance(p)[0] for p in [
        (1, 3, -3),
        (1, -3, 3),
    ]]
    fillet(f6_edges, radius=F6_R)


solid = Compound([f1.part, f2.part, f3.part])
